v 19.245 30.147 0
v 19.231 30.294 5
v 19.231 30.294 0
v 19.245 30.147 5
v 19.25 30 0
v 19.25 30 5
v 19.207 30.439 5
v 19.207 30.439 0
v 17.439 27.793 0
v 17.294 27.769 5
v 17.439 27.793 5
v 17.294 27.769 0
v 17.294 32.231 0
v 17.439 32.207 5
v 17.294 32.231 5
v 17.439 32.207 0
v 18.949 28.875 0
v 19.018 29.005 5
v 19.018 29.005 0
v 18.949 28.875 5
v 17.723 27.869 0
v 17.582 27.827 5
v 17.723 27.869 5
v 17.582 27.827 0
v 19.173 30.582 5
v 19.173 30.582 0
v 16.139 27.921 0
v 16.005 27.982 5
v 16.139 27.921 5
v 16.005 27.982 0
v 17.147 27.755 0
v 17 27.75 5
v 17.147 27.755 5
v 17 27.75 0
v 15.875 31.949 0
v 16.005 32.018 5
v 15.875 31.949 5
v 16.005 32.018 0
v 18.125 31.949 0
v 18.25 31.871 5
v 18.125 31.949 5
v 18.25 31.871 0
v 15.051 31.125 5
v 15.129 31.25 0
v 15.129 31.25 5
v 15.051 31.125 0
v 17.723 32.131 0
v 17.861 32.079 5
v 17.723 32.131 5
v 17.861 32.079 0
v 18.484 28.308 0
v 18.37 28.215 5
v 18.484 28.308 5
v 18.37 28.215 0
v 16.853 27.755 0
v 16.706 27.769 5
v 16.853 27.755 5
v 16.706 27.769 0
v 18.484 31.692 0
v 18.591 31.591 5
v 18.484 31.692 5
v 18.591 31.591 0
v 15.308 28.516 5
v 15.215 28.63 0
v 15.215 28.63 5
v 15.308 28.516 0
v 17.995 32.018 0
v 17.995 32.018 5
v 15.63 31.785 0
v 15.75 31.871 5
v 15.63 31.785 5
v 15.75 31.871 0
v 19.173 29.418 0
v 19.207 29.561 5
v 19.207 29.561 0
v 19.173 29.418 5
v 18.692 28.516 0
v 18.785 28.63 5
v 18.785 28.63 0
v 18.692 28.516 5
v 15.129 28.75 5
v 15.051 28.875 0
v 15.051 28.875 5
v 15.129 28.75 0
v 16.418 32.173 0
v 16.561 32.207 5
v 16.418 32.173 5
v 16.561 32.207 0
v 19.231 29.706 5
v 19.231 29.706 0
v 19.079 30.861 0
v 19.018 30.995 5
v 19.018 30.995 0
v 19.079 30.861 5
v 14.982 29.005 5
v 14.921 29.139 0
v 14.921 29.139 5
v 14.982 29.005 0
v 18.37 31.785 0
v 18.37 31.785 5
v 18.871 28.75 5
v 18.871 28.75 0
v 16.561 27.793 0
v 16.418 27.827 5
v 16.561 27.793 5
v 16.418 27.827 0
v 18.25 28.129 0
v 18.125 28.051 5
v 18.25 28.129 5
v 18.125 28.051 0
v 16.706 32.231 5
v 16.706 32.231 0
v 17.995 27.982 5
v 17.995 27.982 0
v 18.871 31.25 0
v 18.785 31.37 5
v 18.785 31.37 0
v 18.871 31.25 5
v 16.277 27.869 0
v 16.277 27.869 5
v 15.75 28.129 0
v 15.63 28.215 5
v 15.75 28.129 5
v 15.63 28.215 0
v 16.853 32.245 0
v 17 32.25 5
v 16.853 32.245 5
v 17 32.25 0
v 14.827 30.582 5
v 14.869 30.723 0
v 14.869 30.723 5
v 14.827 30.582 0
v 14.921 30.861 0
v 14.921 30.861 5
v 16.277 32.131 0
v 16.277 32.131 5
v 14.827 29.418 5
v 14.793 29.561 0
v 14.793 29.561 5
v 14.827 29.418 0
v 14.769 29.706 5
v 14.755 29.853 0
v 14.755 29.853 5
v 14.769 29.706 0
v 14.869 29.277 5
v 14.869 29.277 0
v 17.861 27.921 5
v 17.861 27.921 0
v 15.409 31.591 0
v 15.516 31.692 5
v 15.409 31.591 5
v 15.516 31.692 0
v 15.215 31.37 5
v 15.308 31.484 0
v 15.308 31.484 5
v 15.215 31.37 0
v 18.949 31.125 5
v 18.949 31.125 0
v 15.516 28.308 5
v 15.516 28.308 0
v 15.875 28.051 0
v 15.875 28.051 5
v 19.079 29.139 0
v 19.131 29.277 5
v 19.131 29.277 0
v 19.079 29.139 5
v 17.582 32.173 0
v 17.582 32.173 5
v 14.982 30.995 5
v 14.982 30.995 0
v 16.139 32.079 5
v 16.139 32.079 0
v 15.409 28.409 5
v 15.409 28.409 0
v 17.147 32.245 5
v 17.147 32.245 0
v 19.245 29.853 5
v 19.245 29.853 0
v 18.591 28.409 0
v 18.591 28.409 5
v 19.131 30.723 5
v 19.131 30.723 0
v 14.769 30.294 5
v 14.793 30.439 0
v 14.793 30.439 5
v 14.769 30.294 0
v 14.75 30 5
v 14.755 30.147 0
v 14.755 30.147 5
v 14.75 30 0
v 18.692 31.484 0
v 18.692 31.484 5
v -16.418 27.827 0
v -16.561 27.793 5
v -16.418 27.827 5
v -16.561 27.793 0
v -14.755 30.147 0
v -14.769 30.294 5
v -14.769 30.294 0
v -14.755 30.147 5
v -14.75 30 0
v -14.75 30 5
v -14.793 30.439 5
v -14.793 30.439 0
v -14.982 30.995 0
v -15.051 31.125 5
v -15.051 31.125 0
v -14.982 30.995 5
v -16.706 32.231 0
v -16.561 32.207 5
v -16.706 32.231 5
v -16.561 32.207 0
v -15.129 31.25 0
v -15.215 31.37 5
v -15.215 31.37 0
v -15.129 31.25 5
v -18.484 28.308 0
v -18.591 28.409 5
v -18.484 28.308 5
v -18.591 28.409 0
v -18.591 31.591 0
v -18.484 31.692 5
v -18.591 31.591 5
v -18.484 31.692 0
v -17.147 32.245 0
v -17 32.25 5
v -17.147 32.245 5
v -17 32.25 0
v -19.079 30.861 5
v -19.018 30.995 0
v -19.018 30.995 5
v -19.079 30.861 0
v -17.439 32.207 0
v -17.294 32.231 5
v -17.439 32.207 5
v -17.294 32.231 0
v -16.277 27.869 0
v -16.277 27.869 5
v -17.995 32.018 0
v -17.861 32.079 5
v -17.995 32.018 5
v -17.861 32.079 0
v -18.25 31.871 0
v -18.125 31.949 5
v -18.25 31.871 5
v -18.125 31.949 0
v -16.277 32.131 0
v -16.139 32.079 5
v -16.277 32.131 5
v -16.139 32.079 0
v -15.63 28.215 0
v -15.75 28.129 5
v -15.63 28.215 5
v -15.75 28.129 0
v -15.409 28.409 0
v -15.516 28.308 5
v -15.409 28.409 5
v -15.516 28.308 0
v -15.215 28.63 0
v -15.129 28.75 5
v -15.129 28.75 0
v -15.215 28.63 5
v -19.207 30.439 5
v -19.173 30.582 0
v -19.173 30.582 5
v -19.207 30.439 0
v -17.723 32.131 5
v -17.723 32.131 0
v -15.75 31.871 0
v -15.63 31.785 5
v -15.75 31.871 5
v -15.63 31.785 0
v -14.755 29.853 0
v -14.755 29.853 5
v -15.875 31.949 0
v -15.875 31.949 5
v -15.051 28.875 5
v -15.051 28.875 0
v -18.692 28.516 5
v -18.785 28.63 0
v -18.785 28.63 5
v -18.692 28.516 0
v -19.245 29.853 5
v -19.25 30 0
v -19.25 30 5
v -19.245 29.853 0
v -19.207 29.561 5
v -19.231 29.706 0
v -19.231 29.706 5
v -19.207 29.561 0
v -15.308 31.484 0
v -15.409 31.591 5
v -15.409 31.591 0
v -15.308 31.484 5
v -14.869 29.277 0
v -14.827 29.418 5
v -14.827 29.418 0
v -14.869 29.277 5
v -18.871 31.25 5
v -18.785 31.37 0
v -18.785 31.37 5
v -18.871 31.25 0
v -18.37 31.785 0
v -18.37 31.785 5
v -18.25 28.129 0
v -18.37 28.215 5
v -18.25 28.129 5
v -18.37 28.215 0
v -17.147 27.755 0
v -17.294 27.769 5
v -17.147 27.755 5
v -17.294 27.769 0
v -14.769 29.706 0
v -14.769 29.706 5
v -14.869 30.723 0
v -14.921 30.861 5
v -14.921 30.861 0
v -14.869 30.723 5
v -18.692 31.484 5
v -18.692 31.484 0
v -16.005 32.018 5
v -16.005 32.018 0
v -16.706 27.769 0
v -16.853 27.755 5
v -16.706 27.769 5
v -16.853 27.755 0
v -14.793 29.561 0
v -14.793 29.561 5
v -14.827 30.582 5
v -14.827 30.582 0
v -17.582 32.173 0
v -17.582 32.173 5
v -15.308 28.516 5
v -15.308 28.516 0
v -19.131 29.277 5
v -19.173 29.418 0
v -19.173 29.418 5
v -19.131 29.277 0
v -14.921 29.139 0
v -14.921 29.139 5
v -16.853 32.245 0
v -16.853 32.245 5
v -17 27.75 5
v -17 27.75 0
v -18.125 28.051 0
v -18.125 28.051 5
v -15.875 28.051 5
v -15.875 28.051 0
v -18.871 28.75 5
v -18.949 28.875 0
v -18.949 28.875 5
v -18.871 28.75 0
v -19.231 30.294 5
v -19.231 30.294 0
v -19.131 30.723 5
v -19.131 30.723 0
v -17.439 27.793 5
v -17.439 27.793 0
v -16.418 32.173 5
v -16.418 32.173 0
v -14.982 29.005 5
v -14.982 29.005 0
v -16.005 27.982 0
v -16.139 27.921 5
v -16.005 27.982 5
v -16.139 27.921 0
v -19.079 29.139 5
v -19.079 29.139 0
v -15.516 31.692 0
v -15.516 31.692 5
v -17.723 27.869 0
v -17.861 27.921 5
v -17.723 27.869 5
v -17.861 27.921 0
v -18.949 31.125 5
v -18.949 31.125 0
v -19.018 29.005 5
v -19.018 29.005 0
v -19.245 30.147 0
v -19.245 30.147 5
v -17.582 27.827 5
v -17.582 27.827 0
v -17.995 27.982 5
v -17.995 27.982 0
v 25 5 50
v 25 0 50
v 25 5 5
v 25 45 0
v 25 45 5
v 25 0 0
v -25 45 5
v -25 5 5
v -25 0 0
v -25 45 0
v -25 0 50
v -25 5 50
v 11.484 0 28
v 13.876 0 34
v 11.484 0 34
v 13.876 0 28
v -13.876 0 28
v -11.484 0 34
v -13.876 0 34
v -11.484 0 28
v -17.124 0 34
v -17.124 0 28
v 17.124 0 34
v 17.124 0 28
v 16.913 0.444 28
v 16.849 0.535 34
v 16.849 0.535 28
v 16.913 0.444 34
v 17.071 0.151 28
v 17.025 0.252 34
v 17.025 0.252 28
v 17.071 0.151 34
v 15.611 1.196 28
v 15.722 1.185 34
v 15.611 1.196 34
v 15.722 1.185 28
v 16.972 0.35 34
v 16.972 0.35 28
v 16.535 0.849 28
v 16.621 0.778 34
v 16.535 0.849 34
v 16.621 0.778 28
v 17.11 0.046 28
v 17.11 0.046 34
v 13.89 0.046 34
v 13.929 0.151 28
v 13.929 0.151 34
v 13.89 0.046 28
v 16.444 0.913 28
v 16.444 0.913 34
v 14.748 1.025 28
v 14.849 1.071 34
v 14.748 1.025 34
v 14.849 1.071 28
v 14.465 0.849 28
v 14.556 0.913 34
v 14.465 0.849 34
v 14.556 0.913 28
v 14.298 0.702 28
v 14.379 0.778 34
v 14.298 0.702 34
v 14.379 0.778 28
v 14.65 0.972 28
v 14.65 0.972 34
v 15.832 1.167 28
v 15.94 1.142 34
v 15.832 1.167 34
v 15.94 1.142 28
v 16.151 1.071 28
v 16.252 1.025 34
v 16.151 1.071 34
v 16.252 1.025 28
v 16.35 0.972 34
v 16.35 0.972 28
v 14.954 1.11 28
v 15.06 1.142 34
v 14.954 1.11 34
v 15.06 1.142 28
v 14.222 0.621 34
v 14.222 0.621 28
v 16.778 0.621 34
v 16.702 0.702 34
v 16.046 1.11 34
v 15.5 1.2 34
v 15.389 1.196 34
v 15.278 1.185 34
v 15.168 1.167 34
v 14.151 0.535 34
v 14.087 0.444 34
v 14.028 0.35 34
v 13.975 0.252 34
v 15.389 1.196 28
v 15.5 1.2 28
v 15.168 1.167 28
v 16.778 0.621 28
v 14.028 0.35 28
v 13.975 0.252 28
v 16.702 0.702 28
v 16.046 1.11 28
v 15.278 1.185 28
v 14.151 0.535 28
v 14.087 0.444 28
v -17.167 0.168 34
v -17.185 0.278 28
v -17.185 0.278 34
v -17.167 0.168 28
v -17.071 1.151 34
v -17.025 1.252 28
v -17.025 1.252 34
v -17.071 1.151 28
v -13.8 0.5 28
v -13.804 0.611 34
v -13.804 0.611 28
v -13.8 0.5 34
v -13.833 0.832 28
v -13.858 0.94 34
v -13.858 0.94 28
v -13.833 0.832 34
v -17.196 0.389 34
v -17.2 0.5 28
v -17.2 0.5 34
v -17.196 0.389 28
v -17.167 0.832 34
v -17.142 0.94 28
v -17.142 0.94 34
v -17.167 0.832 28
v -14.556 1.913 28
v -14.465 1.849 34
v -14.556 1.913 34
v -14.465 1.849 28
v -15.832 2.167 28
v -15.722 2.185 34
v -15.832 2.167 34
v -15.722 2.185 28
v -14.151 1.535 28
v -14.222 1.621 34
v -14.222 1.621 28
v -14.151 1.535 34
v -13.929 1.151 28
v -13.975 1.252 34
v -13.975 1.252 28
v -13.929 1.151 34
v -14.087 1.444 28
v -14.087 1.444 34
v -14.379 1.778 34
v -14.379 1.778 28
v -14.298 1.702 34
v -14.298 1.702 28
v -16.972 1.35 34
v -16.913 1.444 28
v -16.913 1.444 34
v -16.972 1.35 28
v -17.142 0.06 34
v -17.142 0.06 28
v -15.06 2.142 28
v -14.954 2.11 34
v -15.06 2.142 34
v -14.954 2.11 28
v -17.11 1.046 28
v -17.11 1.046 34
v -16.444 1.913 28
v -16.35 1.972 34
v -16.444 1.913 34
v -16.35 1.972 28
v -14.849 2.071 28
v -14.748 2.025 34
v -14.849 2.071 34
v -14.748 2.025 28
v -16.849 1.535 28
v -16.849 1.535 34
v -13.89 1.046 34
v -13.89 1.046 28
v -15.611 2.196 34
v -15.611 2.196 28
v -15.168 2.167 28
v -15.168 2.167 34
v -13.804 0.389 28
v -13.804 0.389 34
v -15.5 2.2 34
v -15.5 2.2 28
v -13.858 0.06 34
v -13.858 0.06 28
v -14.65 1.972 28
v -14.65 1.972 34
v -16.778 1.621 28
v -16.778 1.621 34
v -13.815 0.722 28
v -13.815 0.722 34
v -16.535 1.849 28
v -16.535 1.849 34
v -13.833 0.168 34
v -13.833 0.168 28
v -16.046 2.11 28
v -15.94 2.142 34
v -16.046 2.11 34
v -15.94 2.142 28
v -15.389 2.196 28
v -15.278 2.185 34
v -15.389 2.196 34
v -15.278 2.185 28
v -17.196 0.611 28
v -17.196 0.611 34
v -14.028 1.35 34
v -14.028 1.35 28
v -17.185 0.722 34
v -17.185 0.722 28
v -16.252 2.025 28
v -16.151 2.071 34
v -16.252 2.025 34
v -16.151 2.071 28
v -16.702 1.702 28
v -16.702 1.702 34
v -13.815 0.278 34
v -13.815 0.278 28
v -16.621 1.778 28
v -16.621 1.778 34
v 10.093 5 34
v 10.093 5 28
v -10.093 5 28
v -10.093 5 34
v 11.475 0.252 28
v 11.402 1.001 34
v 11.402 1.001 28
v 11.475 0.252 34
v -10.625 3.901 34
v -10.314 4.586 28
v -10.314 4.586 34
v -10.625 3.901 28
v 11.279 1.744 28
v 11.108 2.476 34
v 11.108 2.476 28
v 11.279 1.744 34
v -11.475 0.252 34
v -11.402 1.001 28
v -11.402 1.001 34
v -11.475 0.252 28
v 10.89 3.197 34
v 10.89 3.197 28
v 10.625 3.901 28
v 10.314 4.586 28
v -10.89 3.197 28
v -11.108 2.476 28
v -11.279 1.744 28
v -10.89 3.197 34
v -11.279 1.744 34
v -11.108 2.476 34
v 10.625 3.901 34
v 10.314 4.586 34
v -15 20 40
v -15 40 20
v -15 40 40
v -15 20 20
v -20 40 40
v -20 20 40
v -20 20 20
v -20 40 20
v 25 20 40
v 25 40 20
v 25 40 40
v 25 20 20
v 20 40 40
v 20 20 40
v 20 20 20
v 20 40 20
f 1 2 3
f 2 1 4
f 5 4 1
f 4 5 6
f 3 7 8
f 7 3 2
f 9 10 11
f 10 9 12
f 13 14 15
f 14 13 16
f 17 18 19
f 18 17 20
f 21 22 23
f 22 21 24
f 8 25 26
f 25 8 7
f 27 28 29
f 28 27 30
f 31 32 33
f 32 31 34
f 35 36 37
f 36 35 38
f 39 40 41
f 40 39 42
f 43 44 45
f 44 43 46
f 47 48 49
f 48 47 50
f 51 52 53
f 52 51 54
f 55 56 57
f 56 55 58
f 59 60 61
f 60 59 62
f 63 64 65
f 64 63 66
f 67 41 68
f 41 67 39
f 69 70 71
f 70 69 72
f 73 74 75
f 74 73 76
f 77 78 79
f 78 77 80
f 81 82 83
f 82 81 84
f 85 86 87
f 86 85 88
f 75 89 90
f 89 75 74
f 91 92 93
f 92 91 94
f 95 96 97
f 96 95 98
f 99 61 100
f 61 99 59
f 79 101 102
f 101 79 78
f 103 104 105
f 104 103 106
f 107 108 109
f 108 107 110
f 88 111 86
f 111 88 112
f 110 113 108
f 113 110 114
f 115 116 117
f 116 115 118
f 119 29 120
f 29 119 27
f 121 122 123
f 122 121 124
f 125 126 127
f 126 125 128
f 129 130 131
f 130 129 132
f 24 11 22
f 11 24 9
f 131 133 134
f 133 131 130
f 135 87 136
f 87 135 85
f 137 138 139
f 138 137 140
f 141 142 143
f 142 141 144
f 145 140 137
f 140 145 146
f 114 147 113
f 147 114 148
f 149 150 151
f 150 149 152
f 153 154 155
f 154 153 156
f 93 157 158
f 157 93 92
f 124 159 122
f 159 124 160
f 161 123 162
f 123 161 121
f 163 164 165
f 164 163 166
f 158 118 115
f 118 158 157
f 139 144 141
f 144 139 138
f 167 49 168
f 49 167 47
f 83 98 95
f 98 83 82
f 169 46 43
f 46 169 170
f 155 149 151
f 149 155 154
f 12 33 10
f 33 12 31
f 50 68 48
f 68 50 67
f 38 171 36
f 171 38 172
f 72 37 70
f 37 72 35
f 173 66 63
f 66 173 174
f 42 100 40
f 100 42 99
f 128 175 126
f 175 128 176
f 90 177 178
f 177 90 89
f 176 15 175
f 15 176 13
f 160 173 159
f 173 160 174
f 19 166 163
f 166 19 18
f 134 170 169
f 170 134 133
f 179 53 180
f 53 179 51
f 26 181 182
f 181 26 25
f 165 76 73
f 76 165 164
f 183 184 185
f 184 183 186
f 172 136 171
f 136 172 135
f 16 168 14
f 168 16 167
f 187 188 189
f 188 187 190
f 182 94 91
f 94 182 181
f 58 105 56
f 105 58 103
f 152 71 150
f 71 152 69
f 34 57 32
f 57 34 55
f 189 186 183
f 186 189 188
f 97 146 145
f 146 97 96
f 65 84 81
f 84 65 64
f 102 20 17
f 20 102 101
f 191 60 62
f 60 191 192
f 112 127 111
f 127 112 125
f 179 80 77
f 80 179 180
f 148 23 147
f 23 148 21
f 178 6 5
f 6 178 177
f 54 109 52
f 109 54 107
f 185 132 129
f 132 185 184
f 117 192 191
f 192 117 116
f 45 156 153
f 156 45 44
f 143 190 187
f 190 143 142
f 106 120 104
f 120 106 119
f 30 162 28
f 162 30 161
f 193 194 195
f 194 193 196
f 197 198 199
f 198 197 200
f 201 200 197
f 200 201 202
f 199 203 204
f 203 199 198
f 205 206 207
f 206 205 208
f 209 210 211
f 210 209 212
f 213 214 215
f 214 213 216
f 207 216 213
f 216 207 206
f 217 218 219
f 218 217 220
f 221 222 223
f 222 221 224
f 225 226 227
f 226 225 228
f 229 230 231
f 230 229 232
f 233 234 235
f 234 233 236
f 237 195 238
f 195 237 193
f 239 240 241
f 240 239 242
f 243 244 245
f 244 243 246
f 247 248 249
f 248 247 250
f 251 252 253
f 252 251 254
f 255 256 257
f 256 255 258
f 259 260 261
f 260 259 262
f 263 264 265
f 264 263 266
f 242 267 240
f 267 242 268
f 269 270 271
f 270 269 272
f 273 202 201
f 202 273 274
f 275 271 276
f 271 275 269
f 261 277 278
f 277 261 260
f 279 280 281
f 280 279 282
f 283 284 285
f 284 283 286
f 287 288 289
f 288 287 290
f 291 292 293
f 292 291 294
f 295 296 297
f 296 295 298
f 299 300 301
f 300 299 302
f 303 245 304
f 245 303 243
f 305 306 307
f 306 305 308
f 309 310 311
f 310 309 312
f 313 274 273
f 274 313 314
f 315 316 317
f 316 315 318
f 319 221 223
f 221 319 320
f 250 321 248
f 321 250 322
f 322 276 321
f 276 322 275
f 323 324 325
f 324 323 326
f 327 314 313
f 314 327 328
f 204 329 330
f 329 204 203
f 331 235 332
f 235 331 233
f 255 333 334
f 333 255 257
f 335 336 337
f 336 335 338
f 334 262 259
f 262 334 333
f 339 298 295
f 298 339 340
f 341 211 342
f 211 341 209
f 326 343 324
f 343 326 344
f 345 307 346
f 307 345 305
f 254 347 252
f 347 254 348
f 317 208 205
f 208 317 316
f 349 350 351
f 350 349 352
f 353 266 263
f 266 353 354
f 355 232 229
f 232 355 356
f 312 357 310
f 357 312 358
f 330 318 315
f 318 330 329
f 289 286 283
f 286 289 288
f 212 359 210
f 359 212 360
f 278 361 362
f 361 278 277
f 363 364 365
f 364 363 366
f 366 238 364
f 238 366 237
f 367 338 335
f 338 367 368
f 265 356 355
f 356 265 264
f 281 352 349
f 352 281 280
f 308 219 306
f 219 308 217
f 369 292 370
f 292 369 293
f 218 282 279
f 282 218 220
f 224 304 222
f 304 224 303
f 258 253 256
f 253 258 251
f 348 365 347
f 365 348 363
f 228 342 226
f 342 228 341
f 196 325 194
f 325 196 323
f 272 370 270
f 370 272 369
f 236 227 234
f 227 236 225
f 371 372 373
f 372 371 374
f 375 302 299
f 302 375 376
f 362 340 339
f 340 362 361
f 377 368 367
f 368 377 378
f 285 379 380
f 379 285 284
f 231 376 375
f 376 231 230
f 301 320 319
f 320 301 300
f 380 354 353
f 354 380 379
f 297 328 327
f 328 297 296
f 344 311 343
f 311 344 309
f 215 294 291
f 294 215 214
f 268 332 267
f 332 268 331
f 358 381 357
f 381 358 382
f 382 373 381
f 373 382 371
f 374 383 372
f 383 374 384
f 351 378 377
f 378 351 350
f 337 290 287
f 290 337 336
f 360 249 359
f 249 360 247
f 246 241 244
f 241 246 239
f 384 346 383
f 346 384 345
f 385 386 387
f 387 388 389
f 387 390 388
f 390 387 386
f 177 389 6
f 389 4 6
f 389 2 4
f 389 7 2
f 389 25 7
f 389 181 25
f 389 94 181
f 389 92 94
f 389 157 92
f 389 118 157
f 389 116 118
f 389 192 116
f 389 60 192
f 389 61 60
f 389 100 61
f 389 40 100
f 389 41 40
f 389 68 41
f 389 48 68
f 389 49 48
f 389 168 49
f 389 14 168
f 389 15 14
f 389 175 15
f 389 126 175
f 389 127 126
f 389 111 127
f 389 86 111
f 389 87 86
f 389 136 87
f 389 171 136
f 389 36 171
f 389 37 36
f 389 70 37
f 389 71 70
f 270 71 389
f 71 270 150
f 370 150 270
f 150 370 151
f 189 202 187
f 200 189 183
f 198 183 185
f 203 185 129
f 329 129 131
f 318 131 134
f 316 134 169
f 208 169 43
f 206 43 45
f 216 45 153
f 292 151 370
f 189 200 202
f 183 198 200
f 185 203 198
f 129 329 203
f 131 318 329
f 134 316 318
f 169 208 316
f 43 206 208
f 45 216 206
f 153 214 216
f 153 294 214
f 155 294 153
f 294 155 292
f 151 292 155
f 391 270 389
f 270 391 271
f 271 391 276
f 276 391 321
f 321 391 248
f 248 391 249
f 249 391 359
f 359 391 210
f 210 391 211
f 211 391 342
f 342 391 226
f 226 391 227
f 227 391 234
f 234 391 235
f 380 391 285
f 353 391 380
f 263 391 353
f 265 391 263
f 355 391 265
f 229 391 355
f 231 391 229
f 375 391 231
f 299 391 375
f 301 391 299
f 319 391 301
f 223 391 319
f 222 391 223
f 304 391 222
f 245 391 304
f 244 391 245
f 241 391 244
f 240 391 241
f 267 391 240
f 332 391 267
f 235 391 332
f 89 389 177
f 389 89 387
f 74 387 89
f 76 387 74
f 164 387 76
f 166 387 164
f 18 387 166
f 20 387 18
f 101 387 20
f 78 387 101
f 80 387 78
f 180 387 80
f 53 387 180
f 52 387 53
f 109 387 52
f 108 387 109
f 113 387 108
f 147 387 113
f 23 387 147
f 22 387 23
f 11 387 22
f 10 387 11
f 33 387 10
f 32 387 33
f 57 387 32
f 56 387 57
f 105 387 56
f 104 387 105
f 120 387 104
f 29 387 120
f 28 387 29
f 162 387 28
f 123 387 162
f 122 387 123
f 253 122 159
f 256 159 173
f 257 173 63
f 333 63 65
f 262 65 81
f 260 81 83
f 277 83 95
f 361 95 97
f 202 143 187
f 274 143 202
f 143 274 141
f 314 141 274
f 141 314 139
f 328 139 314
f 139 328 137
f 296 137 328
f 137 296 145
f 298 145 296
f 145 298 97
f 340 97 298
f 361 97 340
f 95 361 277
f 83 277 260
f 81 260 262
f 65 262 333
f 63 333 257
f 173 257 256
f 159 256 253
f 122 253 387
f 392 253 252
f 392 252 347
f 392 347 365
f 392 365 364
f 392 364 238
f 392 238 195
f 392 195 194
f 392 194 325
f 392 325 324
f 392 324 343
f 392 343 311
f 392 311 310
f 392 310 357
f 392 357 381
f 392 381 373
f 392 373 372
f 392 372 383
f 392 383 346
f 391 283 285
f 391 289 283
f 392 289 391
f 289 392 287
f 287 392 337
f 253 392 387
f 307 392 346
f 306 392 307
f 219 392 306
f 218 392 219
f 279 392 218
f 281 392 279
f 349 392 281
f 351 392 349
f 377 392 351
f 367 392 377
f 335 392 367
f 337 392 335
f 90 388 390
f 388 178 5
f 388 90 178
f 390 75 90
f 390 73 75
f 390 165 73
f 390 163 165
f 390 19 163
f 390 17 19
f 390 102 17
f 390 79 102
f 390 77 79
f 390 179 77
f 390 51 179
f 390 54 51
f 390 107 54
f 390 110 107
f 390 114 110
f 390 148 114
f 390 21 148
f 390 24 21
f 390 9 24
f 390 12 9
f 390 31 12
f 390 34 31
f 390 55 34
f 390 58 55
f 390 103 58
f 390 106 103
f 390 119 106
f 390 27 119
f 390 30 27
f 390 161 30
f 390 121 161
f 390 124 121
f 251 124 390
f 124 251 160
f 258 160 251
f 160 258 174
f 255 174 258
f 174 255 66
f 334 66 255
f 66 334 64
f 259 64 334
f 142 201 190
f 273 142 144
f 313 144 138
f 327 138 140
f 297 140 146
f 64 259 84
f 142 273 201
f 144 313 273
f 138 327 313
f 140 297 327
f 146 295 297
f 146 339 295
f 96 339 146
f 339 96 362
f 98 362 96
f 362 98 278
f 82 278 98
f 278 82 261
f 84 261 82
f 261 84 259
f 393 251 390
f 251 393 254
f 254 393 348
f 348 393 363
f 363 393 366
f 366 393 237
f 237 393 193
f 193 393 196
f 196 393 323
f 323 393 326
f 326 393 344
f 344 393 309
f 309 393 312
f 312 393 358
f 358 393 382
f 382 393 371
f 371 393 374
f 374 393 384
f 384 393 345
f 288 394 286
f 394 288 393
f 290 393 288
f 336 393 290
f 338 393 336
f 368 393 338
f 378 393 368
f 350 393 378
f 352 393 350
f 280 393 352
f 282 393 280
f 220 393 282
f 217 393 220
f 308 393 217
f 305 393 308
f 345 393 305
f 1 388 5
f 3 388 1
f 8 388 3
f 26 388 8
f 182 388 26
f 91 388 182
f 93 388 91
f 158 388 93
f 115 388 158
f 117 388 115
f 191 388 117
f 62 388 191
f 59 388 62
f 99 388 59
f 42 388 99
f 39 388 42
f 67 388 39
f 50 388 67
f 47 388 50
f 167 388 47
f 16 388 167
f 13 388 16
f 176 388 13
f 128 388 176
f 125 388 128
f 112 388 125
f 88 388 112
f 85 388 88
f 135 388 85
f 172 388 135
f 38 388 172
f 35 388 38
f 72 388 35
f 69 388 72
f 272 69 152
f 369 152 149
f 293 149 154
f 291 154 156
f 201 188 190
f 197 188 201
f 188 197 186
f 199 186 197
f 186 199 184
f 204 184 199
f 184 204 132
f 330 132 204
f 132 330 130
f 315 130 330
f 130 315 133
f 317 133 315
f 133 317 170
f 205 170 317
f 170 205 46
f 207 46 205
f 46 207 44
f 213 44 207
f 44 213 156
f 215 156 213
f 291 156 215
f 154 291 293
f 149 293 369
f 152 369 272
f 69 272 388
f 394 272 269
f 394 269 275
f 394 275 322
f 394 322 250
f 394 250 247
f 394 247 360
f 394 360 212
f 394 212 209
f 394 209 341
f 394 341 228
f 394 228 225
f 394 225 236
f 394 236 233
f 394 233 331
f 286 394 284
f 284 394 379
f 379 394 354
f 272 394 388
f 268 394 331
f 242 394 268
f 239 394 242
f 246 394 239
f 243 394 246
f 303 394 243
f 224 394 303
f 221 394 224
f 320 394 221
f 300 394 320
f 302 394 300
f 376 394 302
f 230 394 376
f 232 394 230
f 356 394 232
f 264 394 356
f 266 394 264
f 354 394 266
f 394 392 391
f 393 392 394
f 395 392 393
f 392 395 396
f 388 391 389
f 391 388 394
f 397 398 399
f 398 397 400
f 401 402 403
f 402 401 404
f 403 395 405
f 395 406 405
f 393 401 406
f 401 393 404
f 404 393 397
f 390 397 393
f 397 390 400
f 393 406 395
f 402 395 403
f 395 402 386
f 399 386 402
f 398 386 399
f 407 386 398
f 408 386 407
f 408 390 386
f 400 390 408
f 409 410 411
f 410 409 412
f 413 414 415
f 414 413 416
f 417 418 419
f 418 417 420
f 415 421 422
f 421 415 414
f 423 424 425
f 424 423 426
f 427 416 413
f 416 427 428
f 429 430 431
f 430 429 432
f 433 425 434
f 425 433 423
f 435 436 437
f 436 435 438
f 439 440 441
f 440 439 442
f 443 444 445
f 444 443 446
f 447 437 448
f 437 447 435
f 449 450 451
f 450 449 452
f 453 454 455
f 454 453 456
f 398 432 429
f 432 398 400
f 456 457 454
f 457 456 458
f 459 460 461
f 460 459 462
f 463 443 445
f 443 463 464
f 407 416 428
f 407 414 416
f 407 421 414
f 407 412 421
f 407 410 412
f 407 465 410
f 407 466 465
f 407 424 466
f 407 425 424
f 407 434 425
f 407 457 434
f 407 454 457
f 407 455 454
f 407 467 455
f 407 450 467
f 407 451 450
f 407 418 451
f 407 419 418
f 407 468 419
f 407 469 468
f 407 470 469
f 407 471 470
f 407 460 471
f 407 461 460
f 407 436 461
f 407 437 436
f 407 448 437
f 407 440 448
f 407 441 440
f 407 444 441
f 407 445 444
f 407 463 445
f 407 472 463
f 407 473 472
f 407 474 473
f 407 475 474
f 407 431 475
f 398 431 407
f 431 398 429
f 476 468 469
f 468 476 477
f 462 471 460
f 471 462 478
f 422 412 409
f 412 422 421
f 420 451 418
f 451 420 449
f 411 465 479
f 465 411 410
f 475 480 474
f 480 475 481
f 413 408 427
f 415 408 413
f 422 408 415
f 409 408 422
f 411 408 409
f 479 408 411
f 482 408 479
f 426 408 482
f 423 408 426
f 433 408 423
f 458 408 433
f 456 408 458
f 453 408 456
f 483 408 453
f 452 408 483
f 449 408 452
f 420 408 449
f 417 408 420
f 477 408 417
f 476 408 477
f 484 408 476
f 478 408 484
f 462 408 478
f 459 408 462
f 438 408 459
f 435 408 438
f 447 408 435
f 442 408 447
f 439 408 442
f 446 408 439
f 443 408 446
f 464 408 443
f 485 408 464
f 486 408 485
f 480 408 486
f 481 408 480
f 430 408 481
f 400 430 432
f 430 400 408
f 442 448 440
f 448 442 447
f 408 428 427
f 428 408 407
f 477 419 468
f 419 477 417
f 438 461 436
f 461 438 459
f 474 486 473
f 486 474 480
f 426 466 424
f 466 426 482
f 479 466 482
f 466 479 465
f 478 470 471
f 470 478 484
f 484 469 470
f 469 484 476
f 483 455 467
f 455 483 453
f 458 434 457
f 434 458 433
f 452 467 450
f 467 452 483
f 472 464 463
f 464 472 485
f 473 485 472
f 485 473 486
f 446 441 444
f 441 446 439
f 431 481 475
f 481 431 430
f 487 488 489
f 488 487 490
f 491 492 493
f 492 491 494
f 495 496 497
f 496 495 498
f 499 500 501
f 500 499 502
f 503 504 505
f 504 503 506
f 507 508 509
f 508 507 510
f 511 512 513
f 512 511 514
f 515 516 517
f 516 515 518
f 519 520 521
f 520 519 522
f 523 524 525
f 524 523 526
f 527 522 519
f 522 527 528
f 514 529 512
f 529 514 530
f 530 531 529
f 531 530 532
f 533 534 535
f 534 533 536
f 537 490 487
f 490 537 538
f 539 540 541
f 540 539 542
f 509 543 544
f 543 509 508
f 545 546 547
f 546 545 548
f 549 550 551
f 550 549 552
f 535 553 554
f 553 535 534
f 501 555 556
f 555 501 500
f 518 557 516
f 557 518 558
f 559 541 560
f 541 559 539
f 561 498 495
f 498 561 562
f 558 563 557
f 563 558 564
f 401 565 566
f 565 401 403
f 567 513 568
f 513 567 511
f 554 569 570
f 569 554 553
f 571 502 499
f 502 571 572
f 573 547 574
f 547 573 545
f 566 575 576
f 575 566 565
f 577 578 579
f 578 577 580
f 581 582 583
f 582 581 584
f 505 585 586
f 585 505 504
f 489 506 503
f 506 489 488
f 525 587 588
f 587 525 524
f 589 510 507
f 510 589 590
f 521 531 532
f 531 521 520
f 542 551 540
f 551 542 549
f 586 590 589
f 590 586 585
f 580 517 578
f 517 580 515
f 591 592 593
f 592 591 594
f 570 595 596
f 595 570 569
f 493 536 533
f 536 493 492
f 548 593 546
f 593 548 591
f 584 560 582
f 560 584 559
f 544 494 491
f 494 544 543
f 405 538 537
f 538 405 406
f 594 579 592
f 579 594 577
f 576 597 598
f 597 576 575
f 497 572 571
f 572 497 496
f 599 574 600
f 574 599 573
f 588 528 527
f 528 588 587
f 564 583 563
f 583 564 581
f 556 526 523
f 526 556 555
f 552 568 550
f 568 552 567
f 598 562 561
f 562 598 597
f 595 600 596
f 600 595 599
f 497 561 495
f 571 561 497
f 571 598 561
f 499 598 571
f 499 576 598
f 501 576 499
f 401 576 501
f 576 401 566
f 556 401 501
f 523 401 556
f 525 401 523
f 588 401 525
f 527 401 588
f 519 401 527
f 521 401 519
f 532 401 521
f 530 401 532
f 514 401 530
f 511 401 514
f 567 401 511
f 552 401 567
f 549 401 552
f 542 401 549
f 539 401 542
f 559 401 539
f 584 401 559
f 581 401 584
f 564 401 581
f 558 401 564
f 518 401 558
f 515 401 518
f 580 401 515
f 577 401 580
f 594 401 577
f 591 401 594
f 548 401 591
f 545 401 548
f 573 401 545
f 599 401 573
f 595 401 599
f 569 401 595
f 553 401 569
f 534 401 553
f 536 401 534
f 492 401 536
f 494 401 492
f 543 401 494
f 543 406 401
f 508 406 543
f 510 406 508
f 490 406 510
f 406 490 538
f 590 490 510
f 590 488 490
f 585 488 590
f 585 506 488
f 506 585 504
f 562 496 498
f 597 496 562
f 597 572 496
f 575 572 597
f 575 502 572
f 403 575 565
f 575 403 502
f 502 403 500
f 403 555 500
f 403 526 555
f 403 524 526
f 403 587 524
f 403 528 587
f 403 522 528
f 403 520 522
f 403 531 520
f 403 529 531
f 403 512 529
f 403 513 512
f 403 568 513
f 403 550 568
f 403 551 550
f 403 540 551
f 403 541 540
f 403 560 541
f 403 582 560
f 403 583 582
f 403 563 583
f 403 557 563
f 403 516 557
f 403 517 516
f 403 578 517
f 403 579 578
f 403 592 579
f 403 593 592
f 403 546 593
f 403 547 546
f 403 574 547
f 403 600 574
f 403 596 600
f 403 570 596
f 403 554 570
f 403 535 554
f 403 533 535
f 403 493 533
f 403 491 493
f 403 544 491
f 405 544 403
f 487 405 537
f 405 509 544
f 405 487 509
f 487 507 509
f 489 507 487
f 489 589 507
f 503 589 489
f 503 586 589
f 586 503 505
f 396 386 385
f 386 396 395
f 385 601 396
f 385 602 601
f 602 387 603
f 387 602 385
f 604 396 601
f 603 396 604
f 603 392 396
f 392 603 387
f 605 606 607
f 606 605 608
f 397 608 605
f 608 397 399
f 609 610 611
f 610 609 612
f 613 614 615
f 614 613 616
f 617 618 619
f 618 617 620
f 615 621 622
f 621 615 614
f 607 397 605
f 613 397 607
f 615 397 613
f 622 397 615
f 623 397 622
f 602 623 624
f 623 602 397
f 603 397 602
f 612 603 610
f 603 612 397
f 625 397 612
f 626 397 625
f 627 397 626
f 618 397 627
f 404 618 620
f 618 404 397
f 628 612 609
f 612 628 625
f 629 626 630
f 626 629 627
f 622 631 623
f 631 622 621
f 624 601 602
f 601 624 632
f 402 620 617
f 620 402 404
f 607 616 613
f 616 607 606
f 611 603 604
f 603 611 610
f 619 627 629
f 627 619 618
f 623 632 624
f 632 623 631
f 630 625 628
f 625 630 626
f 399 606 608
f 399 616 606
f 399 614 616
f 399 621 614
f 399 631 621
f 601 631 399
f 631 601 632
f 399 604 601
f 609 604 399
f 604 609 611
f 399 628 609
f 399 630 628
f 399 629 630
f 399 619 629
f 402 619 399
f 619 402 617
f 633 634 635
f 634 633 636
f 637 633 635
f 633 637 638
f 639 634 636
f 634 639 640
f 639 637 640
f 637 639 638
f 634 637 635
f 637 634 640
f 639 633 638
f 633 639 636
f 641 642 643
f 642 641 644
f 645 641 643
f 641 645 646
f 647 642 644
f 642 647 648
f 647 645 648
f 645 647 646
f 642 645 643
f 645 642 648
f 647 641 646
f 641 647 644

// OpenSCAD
// L-shaped mounting bracket for NEMA 17 stepper motor (e.g. syringe pump)
// Print orientation: base plate on the bed, motor plate building upward.

// ---------------- Parameters ----------------
base_x0      = -25;   // base plate, x start (mm)
base_x1      = 25;    // base plate, x end (mm)
base_y0      = 0;     // base plate, y start (mm)
base_y1      = 45;    // base plate, y end (mm)
base_z0      = 0;     // base plate, z start (mm)
base_z1      = 5;     // base plate, z end (mm)
base_hole_r  = 2.25;  // M4 through-hole radius (mm)
base_hole_x  = -17;   // base through-hole x offset (mm)
base_hole_y  = 30;    // base through-hole y offset (mm)

motor_x0     = -25;   // motor plate, x start (mm)
motor_x1     = 25;    // motor plate, x end (mm)
motor_y0     = 0;     // motor plate, y start (mm)
motor_y1     = 5;     // motor plate, y end (mm)
motor_z0     = 0;     // motor plate, z start (mm)
motor_z1     = 50;    // motor plate, z end (mm)
motor_boss_r = 11.5;  // motor boss hole radius (mm)
motor_boss_z = 28;    // motor boss hole centre height (mm)
motor_screw_r = 1.7;  // M3 screw hole radius (mm)
motor_screw_p = 31;   // motor screw pattern size (mm)

gusset_t     = 5;     // gusset thickness (mm)
gusset_leg   = 20;    // gusset leg length (mm)

eps          = 0.5;   // cutter overshoot (mm)
$fn          = 96;    // curve resolution

// ---------------- Model ----------------
union() {
    // Base plate with two M4 through-holes
    difference() {
        translate([base_x0, base_y0, base_z0])
            cube([base_x1 - base_x0, base_y1 - base_y0, base_z1]);
        for (sx = [-1, 1])
            translate([sx * base_hole_x, base_hole_y, -eps])
                cylinder(r = base_hole_r, h = base_z1 + 2 * eps);
    }

    // Vertical motor plate with boss hole and four M3 screw holes
    difference() {
        translate([motor_x0, motor_y0, motor_z0])
            cube([motor_x1 - motor_x0, motor_y1 - motor_y0, motor_z1]);
        translate([0, -eps, motor_boss_z])
            cylinder(r = motor_boss_r, h = motor_y1 - motor_y0 + 2 * eps);
        for (a = [0, 90, 180, 270])
            rotate([0, 0, a])
                translate([motor_screw_p / 2, -eps, motor_boss_z])
                    cylinder(r = motor_screw_r, h = motor_y1 - motor_y0 + 2 * eps);
    }

    // Right-hand gusset, flush with the motor plate
    translate([motor_x0 + gusset_t, gusset_leg, gusset_leg])
        cube([gusset_t, gusset_leg, gusset_leg]);

    // Left-hand gusset, flush with the base plate
    translate([base_x1 - gusset_t, gusset_leg, gusset_leg])
        cube([gusset_t, gusset_leg, gusset_leg]);
}
